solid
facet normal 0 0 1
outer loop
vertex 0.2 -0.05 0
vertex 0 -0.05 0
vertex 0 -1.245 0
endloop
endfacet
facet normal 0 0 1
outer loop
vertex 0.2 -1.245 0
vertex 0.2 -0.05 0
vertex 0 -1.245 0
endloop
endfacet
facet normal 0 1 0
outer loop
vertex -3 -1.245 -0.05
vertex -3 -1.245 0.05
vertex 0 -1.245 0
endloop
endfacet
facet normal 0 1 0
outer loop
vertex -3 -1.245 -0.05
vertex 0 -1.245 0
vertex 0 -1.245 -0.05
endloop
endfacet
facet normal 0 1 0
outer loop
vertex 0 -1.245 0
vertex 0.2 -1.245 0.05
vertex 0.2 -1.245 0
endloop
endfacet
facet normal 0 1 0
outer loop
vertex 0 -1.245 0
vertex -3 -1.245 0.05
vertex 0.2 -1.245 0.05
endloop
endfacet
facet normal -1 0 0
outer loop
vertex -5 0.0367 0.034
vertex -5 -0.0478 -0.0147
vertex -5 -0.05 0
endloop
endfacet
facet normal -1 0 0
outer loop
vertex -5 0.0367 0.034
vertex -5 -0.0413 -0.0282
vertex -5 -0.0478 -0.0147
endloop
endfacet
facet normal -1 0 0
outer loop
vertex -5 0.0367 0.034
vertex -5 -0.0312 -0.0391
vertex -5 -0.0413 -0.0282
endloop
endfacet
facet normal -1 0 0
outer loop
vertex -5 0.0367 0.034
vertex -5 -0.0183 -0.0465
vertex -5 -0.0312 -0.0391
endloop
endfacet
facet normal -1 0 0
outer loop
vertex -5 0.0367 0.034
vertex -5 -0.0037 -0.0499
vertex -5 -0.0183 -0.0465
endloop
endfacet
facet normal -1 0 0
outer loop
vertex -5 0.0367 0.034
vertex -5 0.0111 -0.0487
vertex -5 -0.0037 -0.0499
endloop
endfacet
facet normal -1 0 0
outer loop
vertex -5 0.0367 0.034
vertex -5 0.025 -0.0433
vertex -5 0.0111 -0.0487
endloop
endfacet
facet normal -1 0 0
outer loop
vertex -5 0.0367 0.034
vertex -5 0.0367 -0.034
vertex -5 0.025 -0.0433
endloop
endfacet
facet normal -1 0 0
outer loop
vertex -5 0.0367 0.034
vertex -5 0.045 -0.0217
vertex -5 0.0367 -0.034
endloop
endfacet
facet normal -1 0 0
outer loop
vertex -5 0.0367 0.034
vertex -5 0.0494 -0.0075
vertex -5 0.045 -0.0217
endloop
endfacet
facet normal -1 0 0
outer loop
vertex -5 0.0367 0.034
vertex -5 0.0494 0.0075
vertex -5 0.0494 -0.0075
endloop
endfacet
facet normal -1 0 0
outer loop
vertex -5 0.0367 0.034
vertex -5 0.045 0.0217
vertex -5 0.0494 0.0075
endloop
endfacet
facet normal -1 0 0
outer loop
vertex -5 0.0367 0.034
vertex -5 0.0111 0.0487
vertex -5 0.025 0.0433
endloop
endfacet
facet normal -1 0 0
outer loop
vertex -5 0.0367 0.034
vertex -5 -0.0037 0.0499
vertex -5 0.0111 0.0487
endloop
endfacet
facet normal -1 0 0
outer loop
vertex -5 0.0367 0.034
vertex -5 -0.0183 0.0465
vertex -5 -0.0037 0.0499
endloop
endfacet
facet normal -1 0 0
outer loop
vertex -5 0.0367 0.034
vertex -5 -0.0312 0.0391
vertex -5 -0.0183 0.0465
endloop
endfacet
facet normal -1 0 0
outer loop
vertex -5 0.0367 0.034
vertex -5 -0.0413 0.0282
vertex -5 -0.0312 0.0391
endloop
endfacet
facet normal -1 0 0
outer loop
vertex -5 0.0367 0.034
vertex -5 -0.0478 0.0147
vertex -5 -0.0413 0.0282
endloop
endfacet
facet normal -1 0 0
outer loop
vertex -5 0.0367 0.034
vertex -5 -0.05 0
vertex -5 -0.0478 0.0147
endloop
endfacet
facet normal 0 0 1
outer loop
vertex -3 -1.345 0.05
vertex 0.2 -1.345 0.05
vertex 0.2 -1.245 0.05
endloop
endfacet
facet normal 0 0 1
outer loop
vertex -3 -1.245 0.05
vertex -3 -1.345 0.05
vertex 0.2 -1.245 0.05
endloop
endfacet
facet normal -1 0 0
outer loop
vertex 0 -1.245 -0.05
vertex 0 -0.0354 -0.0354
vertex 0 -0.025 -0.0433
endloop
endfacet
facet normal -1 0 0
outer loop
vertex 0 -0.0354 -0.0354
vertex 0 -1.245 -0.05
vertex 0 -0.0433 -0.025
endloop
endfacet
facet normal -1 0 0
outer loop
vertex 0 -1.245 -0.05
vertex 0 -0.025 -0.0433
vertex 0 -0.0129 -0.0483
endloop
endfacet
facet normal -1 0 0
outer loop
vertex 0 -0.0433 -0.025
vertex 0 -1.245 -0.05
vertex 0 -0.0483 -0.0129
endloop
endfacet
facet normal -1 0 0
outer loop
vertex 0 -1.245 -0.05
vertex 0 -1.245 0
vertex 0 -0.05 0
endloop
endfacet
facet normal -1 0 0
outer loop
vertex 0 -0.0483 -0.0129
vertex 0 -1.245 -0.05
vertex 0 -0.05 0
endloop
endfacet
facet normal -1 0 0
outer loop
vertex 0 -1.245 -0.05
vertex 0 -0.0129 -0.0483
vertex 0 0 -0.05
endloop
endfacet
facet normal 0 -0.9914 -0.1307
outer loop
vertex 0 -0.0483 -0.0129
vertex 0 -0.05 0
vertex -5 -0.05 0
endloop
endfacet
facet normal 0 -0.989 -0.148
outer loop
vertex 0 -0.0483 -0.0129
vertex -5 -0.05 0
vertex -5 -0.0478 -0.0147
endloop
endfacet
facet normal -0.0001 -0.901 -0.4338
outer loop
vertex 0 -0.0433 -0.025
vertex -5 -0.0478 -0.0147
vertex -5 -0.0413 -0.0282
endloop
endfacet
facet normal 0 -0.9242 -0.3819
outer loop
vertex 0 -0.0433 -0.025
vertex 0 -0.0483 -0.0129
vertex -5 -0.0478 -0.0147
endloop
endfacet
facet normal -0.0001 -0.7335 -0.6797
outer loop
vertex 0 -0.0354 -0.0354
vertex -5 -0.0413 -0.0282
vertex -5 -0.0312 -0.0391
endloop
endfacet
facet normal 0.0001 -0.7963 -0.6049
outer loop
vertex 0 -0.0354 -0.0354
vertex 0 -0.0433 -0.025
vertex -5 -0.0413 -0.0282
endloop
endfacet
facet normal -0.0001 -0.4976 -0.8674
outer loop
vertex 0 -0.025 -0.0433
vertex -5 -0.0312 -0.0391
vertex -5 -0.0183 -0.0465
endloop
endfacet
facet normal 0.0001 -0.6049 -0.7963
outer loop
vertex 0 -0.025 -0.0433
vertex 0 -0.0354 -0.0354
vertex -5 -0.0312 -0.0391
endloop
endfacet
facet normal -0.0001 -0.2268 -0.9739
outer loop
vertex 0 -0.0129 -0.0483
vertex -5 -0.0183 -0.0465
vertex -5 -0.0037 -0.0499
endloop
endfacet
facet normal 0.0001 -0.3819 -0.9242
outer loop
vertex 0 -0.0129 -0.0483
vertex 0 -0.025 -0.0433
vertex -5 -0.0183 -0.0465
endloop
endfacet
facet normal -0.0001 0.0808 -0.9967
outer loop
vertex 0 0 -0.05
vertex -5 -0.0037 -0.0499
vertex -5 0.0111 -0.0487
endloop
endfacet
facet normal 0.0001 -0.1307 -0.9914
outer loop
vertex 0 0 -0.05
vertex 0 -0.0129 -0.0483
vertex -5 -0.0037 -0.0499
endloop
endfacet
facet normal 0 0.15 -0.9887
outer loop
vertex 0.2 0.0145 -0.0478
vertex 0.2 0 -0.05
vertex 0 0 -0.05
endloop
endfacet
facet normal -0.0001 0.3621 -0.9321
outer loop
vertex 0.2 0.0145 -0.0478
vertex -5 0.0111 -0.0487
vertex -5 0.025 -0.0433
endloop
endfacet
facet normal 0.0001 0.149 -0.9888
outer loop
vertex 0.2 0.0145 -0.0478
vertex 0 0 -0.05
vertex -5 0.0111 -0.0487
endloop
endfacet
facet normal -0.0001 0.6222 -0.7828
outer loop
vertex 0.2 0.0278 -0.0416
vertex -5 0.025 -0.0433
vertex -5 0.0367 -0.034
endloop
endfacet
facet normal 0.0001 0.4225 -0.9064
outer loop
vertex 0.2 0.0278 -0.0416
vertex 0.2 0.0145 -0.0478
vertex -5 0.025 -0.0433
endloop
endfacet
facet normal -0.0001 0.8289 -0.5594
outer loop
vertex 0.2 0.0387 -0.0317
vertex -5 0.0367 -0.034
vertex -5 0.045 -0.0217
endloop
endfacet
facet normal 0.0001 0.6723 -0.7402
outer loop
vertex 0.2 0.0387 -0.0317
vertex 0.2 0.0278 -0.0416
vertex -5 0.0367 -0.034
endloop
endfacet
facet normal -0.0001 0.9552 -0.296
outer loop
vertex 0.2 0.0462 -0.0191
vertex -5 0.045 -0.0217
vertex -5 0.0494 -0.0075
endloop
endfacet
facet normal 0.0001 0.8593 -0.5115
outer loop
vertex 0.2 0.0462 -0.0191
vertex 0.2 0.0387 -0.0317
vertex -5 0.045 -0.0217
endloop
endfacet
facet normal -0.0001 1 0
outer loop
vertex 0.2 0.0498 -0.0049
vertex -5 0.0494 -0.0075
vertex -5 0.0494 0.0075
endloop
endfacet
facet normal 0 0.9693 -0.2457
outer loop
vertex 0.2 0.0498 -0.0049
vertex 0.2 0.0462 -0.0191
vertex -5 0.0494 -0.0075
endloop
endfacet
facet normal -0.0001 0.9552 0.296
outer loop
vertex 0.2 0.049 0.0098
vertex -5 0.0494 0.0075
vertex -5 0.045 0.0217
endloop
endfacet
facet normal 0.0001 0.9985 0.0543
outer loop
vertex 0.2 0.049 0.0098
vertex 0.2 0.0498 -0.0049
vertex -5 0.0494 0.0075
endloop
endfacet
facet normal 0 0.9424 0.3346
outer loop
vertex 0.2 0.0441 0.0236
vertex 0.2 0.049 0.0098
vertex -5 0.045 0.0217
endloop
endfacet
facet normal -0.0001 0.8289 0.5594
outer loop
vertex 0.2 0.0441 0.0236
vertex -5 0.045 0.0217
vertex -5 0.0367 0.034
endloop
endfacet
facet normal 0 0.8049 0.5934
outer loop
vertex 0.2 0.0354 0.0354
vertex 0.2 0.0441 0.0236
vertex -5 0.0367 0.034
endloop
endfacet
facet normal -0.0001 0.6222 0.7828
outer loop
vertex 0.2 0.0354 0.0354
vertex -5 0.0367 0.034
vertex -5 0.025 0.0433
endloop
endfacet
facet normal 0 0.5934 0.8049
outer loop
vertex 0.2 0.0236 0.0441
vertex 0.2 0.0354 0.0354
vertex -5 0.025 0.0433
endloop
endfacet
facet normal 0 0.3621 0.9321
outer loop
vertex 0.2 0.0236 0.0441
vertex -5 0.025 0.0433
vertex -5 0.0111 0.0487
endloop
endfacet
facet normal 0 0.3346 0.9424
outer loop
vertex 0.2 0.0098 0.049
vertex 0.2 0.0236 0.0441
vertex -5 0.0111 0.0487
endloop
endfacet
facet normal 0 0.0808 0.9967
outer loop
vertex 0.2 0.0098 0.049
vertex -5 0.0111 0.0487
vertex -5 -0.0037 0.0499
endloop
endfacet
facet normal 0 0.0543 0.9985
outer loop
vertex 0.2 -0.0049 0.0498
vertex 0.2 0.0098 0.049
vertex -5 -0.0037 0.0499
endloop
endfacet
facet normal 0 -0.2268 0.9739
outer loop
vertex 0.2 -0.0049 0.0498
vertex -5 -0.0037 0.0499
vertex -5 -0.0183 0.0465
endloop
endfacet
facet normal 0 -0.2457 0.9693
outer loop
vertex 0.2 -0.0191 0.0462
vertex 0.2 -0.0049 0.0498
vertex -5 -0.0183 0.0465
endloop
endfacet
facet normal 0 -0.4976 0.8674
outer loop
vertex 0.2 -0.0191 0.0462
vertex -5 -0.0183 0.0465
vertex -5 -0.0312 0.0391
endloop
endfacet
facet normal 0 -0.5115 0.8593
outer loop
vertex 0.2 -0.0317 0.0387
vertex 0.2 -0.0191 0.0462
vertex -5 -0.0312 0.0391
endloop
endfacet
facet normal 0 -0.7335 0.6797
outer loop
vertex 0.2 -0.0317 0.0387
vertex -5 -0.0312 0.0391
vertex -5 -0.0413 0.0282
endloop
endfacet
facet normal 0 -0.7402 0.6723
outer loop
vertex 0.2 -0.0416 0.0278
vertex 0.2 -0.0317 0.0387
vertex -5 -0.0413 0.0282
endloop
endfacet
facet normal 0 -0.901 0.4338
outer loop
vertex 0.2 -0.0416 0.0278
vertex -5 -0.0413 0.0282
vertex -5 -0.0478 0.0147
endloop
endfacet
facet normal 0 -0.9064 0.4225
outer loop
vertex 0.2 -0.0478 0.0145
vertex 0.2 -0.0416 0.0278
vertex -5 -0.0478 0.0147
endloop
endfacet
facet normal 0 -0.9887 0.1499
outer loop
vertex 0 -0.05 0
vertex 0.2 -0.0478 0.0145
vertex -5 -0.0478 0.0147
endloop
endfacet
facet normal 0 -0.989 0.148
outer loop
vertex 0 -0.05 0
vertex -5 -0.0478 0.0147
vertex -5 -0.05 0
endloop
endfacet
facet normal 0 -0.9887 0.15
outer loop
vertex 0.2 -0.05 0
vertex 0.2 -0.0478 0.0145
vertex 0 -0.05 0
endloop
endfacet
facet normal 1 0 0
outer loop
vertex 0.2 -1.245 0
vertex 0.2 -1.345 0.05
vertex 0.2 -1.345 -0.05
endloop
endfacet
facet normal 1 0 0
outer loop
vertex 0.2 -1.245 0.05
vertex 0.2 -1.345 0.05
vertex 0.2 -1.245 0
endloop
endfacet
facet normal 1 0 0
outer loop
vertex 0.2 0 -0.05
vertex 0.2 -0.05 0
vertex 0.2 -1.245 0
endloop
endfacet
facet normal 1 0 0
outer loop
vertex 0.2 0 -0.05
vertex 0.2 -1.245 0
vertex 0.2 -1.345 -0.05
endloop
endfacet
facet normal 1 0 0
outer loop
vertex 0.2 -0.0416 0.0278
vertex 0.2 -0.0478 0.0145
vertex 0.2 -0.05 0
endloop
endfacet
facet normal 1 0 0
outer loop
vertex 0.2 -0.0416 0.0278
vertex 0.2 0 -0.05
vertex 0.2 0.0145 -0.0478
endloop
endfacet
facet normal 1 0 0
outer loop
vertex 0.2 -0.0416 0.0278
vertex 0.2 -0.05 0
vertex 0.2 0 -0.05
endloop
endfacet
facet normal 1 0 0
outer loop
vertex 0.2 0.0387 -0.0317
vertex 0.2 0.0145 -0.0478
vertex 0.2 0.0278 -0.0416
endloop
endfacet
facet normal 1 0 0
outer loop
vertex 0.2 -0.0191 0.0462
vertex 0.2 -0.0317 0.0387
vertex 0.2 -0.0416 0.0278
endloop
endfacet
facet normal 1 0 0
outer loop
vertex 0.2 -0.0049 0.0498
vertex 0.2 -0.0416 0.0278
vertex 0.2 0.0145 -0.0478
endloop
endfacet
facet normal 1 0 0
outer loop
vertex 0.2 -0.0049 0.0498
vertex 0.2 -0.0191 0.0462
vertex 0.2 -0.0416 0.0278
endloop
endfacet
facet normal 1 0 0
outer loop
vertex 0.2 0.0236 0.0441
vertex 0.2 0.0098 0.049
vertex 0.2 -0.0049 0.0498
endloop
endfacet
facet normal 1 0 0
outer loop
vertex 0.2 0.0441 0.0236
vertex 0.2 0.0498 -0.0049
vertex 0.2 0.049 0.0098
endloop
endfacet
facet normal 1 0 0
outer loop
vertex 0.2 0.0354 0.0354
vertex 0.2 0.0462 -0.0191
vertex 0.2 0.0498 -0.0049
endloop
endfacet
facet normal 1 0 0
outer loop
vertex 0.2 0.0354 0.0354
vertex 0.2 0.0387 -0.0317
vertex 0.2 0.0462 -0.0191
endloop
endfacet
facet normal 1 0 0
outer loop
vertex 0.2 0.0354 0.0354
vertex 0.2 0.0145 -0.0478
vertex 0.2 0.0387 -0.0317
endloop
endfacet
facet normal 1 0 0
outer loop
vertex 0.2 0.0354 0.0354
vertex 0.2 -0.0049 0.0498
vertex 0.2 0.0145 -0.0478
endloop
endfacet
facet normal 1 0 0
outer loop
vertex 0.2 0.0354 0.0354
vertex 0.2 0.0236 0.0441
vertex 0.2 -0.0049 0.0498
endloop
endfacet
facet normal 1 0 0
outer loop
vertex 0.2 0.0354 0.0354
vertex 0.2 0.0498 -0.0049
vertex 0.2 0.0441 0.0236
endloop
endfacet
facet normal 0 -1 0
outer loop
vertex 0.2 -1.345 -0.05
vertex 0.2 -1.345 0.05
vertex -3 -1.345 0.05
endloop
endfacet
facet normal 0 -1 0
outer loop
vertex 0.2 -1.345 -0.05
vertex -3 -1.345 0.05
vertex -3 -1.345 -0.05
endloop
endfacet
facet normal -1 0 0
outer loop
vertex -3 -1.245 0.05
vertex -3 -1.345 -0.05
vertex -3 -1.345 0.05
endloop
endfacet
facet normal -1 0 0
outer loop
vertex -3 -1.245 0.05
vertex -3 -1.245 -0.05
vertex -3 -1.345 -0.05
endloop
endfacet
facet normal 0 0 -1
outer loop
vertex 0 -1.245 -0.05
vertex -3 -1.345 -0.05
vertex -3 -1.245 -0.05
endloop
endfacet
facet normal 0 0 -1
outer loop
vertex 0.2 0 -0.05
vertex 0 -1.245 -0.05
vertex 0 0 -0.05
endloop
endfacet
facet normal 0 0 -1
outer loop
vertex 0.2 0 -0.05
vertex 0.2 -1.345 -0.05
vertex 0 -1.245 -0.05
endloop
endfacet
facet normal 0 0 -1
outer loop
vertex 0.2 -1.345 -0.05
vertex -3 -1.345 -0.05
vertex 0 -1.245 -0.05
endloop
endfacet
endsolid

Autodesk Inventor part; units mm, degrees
ref_plane "YZ Plane" through (0, 0, 0) normal (1, 0, 0) x (0, 1, 0)
ref_plane "XZ Plane" through (0, 0, 0) normal (0, 1, 0) x (-1, 0, 0)
ref_plane "XY Plane" through (0, 0, 0) normal (0, 0, 1) x (1, 0, 0)
sketch "Sketch1" plane through (0, 0, 0) normal (1, 0, 0) x (0, 1, 0)
  circle A0 centre (0, 0) radius 0.05
  line L0 (0, 0) -> (-1.295, 0)
  line L1 (-1.345, 0.05) -> (-1.245, 0.05)
  line L2 (-1.245, 0.05) -> (-1.245, -0.05)
  line L3 (-1.245, -0.05) -> (-1.345, -0.05)
  line L4 (-1.345, -0.05) -> (-1.345, 0.05)
  line L5 (-1.345, 0.05) -> (-1.245, -0.05) construction
  line L6 (-1.245, 0.05) -> (-1.345, -0.05) construction
  line L7 (-1.245, -0.05) -> (0, -0.05)
  point P0 (-0.05, 0)
  point P1 (-1.245, 0)
  dimension "d0" = 0.1
  dimension "d1" = 1.295
  dimension "d2" = 0.1
  dimension "d3" = 0.1
extrude "Extrusion1" add sketch "Sketch1" along normal blind 0.2
sketch "Sketch2" plane through (0, 0, 0) normal (-1, 0, 0) x (0, 0, 1)
  arc A0 (0, -0.05) -> (-0.05, 0) centre (0, 0) ccw projected
  circle A1 centre (0, 0) radius 0.05
  point P0 (-0.05, 0)
  point P1 (0, -0.05)
  dimension "d6" = 0.1
extrude "Extrusion2" add sketch "Sketch2" along normal blind 5
sketch "Sketch3" plane through (0, 0, 0) normal (-1, 0, 0) x (0, 0, 1)
  line L0 (-0.05, -1.345) -> (-0.05, 0) projected
  line L1 (0.05, -1.345) -> (-0.05, -1.345) projected
  line L2 (-0.05, -1.345) -> (0.05, -1.345)
  line L3 (0, -1.245) -> (0.05, -1.245) projected
  line L4 (0.05, -1.345) -> (0.05, -1.245)
  line L5 (0.05, -1.245) -> (-0.05, -1.245)
  line L6 (-0.05, -1.245) -> (-0.05, -1.345)
  point P0 (0, 0)
extrude "Extrusion3" add sketch "Sketch3" along normal blind 3
properties part number "Bone20_19_Fix"
